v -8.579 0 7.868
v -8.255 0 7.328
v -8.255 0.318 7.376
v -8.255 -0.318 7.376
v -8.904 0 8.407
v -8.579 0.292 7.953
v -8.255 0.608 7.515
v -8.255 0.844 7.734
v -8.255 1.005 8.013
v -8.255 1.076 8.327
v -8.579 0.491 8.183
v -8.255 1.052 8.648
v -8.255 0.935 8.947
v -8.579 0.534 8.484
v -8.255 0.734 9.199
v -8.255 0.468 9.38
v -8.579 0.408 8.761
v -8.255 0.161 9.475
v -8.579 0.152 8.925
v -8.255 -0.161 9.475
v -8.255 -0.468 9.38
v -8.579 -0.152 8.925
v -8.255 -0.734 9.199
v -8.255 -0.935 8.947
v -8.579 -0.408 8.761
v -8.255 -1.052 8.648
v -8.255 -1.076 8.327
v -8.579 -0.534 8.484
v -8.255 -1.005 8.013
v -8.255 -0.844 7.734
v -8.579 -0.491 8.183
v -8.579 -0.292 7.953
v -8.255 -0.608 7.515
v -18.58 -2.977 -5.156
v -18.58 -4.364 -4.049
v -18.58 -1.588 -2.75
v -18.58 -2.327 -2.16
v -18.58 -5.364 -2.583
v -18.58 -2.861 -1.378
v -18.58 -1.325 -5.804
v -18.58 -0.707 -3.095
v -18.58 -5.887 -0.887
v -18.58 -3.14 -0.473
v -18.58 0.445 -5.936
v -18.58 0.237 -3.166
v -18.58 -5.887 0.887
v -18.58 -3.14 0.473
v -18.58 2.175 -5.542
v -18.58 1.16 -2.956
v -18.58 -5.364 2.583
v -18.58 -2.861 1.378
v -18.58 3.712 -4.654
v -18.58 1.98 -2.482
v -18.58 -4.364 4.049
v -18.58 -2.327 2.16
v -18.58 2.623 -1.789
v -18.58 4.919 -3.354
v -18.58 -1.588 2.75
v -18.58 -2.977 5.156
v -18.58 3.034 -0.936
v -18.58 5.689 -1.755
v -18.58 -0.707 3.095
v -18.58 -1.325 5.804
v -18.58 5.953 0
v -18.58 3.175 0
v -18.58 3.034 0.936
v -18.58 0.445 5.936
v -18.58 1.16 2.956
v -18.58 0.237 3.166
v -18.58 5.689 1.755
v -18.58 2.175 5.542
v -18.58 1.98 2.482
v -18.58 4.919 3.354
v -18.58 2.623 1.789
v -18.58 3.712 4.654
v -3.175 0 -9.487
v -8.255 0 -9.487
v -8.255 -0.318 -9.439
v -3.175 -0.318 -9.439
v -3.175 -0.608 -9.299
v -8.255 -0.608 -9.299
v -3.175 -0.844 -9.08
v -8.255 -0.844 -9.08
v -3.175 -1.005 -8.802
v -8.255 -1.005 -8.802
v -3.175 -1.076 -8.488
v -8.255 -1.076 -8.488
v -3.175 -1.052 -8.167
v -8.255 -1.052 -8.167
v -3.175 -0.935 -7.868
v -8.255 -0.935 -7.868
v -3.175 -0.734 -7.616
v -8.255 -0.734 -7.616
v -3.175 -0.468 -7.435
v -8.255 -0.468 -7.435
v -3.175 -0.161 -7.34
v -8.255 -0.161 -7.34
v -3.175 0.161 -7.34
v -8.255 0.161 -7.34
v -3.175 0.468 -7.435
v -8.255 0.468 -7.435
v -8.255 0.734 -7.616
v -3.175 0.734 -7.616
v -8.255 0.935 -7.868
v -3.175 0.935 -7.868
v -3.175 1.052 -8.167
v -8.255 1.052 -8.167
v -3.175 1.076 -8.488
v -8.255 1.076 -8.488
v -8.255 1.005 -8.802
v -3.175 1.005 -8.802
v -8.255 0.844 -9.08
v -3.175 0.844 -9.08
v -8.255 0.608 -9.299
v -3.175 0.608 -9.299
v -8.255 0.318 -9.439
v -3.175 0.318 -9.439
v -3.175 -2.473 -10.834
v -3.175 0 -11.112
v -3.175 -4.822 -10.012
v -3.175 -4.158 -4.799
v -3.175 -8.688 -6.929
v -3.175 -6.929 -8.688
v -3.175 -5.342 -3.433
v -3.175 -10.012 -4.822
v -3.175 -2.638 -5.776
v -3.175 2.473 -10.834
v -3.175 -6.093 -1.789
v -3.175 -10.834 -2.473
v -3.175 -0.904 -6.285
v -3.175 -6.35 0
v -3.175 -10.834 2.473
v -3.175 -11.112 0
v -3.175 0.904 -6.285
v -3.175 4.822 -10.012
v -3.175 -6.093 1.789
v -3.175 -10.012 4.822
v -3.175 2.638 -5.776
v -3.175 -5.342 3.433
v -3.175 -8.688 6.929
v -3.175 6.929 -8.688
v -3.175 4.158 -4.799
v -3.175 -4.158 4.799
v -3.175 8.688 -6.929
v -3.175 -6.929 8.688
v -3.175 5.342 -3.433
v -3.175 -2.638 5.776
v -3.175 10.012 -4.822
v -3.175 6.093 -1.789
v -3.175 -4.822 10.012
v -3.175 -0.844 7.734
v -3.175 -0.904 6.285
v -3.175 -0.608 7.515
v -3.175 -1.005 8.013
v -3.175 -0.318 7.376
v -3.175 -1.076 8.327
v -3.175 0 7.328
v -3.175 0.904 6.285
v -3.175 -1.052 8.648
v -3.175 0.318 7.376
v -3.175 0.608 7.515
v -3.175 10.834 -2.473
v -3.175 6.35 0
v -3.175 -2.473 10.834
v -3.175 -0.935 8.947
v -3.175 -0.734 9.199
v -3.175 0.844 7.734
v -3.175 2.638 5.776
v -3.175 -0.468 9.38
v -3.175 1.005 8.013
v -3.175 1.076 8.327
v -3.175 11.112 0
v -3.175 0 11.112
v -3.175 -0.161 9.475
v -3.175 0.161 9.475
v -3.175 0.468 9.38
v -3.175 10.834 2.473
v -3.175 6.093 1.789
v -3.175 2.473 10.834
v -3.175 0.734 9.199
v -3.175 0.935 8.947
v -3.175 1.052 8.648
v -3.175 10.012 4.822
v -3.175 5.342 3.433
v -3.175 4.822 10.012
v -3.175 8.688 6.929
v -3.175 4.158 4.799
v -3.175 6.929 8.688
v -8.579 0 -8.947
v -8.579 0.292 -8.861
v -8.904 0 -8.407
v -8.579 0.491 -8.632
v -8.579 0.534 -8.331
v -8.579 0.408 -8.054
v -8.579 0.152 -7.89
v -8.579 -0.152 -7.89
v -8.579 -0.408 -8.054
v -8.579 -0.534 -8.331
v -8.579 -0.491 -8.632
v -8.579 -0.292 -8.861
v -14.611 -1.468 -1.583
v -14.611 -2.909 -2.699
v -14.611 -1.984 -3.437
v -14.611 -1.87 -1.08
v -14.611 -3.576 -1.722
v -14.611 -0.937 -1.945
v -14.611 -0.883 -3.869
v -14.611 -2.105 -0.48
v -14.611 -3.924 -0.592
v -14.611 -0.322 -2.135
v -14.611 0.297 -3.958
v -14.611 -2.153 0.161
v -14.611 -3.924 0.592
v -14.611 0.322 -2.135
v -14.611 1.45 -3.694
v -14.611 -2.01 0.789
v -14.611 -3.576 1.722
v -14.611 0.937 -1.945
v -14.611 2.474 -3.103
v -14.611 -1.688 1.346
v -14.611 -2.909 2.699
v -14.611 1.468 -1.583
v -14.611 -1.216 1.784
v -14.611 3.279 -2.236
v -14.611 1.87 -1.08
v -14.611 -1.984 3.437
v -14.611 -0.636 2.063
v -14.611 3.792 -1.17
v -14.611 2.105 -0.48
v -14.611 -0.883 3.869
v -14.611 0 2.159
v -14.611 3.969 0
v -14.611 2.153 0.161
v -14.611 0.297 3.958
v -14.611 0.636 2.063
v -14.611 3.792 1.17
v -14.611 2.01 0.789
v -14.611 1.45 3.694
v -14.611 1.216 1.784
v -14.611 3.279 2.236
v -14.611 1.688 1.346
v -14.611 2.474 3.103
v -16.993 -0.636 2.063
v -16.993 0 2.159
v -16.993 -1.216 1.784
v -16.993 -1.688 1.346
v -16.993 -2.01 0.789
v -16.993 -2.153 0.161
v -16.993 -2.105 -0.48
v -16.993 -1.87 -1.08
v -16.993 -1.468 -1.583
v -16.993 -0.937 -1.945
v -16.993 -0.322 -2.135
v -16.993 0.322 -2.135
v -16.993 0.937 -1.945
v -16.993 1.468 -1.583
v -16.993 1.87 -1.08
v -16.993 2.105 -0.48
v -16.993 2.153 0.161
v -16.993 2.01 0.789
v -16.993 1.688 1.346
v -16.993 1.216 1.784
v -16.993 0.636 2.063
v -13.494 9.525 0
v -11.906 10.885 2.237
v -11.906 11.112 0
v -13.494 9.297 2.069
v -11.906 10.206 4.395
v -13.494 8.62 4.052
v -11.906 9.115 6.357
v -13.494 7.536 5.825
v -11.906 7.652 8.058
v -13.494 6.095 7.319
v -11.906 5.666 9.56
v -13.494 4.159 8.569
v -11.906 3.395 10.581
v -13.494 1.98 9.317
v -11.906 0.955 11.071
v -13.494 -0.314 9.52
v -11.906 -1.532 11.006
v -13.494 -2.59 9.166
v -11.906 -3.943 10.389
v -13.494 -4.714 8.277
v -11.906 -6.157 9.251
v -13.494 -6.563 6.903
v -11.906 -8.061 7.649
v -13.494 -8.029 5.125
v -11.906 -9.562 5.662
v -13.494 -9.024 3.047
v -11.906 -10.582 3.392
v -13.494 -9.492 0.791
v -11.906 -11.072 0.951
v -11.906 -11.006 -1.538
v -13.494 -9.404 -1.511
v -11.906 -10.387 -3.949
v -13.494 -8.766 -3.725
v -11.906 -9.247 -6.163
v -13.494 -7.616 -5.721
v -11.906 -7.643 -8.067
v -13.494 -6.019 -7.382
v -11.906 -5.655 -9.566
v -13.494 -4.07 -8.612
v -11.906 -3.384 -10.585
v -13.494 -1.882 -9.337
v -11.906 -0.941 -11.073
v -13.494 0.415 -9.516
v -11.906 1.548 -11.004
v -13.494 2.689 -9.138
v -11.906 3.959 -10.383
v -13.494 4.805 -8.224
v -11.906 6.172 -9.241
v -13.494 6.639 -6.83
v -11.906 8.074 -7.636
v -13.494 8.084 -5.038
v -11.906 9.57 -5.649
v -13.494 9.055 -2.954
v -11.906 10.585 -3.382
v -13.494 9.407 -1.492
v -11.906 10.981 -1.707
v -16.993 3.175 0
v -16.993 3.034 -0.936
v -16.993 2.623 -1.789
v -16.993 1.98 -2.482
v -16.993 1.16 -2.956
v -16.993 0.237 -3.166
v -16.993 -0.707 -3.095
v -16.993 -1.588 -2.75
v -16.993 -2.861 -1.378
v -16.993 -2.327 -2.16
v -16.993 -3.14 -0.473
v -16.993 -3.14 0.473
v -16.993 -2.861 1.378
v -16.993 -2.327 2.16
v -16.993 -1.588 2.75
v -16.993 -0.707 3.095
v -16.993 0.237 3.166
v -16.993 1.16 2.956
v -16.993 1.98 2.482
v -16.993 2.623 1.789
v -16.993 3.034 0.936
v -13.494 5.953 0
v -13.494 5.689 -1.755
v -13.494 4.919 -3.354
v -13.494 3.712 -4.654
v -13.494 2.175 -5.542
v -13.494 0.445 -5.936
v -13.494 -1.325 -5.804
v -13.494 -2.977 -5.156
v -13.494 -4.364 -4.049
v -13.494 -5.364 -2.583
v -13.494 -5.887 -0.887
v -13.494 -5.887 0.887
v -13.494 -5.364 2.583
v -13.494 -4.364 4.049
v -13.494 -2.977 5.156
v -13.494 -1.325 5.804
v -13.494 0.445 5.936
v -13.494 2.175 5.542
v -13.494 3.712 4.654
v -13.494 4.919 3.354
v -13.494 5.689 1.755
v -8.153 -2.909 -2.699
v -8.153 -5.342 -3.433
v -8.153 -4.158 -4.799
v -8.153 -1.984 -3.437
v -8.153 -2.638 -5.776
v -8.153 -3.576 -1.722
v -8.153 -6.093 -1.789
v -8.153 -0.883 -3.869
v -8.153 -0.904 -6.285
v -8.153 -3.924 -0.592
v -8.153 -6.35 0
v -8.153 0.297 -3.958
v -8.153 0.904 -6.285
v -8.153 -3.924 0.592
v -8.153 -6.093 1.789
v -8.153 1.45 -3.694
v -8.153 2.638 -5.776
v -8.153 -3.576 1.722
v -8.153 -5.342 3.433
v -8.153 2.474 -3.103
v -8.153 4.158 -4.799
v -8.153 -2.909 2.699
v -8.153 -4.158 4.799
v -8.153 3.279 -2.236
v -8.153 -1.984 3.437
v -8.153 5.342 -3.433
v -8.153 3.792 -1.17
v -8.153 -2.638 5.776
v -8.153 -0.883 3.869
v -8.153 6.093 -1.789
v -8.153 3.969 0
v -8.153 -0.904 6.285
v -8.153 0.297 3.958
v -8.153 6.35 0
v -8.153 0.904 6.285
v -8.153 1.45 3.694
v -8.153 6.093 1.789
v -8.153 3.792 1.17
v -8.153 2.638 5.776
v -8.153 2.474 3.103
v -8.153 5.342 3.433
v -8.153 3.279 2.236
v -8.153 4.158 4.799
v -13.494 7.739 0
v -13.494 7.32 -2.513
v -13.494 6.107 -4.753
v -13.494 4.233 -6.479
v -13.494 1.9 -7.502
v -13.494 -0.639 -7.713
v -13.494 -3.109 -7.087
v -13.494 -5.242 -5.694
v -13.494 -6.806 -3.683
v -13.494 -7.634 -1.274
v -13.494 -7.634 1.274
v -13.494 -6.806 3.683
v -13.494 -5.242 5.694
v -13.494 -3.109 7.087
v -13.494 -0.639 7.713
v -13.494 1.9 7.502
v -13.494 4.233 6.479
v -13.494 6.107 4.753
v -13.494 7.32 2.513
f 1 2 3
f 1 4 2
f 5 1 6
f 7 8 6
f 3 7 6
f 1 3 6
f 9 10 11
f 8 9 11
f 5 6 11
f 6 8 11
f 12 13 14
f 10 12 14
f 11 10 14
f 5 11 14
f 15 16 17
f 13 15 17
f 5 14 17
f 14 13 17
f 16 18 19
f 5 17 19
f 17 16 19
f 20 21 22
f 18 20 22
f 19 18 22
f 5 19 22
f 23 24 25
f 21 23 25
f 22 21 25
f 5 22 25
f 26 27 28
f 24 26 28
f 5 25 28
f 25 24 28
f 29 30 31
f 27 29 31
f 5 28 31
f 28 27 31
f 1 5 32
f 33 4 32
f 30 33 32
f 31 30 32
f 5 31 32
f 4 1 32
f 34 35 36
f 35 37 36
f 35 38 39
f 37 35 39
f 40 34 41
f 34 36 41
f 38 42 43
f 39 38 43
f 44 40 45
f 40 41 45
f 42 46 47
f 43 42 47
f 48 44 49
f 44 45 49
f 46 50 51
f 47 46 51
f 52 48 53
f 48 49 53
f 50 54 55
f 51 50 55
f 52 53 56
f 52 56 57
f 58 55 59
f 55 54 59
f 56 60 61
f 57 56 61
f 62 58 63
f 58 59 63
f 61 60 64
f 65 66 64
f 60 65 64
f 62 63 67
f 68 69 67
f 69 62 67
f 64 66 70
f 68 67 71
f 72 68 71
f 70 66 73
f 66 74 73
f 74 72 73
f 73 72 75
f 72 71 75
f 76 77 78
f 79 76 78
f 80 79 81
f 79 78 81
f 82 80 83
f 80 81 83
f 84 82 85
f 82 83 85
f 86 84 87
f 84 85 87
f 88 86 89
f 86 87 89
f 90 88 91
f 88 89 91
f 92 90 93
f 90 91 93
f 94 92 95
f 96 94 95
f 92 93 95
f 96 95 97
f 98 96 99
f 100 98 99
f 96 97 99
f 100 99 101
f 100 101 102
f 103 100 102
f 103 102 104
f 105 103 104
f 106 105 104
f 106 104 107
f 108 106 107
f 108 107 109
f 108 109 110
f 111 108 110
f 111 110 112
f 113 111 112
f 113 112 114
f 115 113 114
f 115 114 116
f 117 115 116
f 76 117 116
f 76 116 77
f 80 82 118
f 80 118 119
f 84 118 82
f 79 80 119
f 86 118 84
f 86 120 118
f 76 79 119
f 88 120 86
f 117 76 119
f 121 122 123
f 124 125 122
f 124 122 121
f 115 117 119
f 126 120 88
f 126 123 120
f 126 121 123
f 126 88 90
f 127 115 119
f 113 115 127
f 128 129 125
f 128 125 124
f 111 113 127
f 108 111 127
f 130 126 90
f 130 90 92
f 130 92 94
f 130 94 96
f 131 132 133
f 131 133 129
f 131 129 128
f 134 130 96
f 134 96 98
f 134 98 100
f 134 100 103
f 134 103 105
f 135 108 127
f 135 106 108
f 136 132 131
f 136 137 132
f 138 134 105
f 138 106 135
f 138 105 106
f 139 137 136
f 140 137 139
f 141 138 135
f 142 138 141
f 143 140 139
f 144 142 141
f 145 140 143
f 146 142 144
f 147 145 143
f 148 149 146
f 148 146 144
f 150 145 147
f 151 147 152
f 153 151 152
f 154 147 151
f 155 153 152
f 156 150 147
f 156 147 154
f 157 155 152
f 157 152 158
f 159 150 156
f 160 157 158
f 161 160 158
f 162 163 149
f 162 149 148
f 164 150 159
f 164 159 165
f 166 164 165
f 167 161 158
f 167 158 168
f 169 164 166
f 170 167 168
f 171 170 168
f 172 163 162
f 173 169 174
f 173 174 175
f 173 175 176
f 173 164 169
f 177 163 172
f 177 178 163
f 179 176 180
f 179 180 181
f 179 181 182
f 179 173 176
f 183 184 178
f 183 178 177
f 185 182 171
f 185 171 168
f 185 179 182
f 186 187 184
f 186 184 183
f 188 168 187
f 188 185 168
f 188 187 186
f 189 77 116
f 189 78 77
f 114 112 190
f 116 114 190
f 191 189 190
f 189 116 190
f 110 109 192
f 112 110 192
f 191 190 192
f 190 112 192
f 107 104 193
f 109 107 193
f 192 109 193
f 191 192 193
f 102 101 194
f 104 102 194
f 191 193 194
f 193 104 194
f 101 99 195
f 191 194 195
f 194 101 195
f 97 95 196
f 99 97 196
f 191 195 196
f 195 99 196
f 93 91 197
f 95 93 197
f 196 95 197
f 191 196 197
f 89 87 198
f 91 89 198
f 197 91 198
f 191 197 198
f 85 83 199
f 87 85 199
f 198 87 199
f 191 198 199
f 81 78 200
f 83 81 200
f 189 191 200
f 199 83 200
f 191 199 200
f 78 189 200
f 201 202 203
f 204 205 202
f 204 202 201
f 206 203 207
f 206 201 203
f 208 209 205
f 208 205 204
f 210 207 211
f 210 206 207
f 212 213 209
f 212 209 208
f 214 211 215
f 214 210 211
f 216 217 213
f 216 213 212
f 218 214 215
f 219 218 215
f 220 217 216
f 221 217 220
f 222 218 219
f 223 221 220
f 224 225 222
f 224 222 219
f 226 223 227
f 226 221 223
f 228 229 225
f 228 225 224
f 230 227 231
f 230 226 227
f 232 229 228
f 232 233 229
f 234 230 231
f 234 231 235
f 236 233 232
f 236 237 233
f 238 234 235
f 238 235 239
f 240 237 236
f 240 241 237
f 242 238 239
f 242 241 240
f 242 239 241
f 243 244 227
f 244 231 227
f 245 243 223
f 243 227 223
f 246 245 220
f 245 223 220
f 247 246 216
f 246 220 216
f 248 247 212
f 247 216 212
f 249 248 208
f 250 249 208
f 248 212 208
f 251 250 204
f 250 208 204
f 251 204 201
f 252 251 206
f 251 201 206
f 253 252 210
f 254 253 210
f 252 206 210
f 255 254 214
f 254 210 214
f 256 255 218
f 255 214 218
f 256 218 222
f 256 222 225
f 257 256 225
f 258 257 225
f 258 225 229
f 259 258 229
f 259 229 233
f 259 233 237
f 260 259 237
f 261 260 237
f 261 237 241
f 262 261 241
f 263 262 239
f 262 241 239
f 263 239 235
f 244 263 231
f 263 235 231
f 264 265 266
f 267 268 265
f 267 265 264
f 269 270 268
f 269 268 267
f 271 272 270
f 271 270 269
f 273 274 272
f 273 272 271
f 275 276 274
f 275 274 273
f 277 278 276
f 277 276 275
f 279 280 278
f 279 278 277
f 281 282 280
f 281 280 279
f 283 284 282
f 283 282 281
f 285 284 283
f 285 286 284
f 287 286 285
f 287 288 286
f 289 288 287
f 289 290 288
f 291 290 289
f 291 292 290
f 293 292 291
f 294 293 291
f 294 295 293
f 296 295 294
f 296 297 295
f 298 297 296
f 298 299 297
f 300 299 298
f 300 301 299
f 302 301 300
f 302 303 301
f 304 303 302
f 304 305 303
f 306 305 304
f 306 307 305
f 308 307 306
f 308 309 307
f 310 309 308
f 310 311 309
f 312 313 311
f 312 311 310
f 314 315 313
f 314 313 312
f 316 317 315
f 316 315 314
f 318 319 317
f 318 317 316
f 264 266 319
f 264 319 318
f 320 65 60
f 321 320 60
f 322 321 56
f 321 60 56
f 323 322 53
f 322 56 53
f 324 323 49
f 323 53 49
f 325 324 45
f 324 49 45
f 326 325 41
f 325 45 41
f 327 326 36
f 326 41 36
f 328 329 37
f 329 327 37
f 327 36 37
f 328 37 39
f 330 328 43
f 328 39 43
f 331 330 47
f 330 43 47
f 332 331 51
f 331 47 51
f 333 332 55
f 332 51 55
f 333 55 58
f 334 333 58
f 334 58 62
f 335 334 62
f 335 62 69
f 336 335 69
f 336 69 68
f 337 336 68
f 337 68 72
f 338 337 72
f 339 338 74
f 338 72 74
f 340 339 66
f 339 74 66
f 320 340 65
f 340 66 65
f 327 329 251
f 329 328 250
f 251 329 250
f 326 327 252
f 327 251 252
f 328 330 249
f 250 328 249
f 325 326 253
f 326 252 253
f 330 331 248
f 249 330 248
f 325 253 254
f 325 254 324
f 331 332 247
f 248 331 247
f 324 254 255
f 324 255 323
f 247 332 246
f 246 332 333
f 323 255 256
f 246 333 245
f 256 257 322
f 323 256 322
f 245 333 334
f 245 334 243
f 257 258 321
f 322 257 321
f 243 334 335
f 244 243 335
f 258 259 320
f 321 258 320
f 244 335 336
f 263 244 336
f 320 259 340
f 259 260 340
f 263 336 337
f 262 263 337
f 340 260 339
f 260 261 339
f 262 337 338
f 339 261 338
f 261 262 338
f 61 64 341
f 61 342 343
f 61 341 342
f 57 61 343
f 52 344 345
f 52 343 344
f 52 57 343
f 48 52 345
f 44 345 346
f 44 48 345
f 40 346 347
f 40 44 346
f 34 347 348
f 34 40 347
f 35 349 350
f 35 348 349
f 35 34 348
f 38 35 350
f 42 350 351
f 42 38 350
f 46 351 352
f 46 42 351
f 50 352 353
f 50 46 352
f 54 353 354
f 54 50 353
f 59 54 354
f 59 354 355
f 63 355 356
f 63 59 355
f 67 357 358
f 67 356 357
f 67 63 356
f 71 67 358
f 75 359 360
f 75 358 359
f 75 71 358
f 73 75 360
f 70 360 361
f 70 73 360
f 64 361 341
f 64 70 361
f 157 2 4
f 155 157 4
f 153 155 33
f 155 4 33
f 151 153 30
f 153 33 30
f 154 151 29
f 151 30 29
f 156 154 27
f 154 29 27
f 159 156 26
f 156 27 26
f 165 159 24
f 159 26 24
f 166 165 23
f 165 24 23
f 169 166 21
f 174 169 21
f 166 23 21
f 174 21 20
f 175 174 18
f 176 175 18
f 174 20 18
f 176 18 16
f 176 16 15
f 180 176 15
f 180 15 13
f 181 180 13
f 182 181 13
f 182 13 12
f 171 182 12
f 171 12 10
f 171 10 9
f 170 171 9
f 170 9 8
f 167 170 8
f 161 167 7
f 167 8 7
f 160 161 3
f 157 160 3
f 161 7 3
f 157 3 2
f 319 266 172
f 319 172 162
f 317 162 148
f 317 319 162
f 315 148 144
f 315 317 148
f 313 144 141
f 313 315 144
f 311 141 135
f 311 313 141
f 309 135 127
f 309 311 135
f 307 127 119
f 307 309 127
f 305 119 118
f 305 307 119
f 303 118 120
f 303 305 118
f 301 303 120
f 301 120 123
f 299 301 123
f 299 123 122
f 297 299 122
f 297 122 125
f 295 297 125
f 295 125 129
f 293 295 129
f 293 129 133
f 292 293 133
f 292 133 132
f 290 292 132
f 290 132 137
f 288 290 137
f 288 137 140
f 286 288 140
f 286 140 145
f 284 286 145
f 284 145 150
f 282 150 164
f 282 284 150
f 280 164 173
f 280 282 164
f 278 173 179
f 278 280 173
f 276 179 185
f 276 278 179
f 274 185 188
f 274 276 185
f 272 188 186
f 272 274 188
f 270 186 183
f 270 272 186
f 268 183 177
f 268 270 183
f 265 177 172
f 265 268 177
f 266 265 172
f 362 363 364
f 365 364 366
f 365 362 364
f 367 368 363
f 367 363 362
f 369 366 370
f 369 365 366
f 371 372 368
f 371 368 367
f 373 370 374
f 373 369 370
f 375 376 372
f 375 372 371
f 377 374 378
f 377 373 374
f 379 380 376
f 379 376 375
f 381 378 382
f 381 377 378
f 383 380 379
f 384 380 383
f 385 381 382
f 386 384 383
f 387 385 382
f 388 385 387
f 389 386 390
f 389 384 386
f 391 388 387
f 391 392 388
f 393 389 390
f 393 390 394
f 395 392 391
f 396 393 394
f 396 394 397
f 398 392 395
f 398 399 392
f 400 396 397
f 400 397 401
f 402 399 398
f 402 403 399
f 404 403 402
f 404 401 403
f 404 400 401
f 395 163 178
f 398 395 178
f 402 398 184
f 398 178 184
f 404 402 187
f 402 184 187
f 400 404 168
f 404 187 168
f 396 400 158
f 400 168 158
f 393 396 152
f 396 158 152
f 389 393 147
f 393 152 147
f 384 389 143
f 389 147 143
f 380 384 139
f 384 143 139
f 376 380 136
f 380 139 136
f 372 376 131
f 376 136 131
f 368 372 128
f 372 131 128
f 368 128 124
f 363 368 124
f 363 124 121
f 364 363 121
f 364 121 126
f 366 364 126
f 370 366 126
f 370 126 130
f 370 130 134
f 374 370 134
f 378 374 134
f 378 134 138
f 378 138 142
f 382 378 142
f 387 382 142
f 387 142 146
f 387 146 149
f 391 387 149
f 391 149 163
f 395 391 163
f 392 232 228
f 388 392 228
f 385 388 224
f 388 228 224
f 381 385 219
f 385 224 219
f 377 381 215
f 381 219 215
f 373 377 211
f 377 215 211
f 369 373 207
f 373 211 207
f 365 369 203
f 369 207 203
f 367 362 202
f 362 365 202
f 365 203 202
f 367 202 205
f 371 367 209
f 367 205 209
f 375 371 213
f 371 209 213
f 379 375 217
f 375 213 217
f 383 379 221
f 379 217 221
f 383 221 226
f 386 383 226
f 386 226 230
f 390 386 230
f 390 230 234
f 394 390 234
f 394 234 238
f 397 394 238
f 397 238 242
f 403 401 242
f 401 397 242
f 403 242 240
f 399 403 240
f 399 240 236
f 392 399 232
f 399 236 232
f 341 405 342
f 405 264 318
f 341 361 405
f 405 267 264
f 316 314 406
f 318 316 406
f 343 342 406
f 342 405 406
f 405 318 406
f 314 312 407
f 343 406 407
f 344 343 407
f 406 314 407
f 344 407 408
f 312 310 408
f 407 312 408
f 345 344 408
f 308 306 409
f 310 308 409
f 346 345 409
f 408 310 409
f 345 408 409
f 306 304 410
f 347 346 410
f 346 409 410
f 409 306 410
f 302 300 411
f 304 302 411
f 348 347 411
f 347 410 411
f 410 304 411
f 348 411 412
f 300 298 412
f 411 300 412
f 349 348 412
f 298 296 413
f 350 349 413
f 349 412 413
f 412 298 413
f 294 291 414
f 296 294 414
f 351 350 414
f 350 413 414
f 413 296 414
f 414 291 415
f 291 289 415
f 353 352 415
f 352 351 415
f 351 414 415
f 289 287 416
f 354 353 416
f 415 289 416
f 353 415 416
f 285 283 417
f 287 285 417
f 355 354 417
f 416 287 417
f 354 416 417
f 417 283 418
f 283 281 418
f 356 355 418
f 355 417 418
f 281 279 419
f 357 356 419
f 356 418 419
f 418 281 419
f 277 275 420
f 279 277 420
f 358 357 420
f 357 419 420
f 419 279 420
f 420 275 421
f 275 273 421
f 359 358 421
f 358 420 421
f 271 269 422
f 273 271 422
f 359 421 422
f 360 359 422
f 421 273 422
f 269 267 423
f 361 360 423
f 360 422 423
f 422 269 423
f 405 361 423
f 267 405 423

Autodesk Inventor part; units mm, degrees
ref_plane "YZ Plane" through (0, 0, 0) normal (1, 0, 0) x (0, 1, 0)
ref_plane "XZ Plane" through (0, 0, 0) normal (0, 1, 0) x (-1, 0, 0)
ref_plane "XY Plane" through (0, 0, 0) normal (0, 0, 1) x (1, 0, 0)
sketch "Sketch1" plane through (0, 0, 0) normal (0, 0, 1) x (1, 0, 0)
  line L0 (0, 0) -> (8.7313, 0) construction
  line L1 (0, 0) -> (0, 7.9375) construction
  line L2 (0, 7.9375) -> (8.7312, 7.9375) construction
  line L3 (8.7312, 7.9375) -> (8.7313, 0) construction
  line L4 (8.7312, 7.9375) -> (45.2438, 7.9375) construction
  line L5 (8.7312, 7.9375) -> (8.7312, 14.2875) construction
  line L6 (8.7312, 14.2875) -> (9.525, 14.2875) construction
  line L7 (9.525, 14.2875) -> (9.525, 0) construction
  line L8 (9.525, 0) -> (8.7313, 0) construction
  line L9 (9.525, 0) -> (19.05, 0) construction
  line L10 (19.05, 0) -> (19.05, 26.67) construction
  line L11 (19.05, 26.67) -> (9.525, 26.67) construction
  line L12 (9.525, 26.67) -> (9.525, 14.2875) construction
  line L13 (14.2875, 0) -> (14.2875, 26.67) construction
  line L14 (14.2875, 17.4625) -> (21.4312, 17.4625) construction
  line L15 (21.4312, 17.4625) -> (21.4313, 0) construction
  line L16 (21.4313, 0) -> (19.05, 0) construction
  line L17 (21.4313, 0) -> (22.225, 0) construction
  line L18 (22.225, 0) -> (22.225, 14.2875) construction
  line L19 (22.225, 14.2875) -> (21.4313, 14.2875) construction
  line L20 (21.4313, 14.2875) -> (21.4313, 0) construction
  line L21 (22.225, 0) -> (31.75, 0) construction
  line L22 (31.75, 0) -> (31.75, 20.32) construction
  line L23 (31.75, 20.32) -> (22.225, 20.32) construction
  line L24 (22.225, 20.32) -> (22.225, 0) construction
  line L25 (26.9875, 20.32) -> (26.9875, 0) construction
  line L26 (26.9875, 17.4625) -> (34.1313, 17.4625) construction
  line L27 (34.1313, 17.4625) -> (34.1313, 0) construction
  line L28 (34.1313, 0) -> (31.75, 0) construction
  line L29 (34.1313, 0) -> (34.925, 0) construction
  line L30 (34.925, 0) -> (34.925, 14.2875) construction
  line L31 (34.925, 14.2875) -> (34.1313, 14.2875) construction
  line L32 (34.1313, 14.2875) -> (34.1313, 0) construction
  line L33 (34.925, 0) -> (36.5125, 0) construction
  line L34 (36.5125, 0) -> (36.5125, 9.525) construction
  line L35 (36.5125, 9.525) -> (34.925, 9.525) construction
  line L36 (34.925, 9.525) -> (34.925, 0) construction
  line L37 (45.2438, 7.9375) -> (45.2438, 0) construction
  line L38 (45.2438, 0) -> (36.5125, 0) construction
  line L39 (11.9063, 26.67) -> (11.9063, 0) construction
  line L40 (24.6063, 20.32) -> (24.6063, 0) construction
  line L41 (0, 7.9375) -> (0, 17.4625) construction
  line L42 (0, 17.4625) -> (8.7312, 17.4625) construction
  line L43 (8.7312, 17.4625) -> (8.7312, 14.2875) construction
  line L44 (0, 3.175) -> (45.2438, 3.175) construction
  circle A0 centre (11.9063, 5.5562) radius 2.3813 construction
  circle A1 centre (24.6063, 5.5562) radius 2.3812 construction
  circle A2 centre (11.9063, 5.8103) radius 2.3813 construction
  circle A3 centre (11.9063, 7.5565) radius 2.3813 construction
  circle A4 centre (24.6063, 5.8103) radius 2.3812 construction
  circle A5 centre (24.6063, 7.5565) radius 2.3812 construction
  line L45 (9.525, 8.1915) -> (14.2875, 8.1915) construction
  line L46 (12.6386, 3.175) -> (14.6388, 5.1753) construction
  line L47 (14.6388, 5.1753) -> (21.8737, 5.1753) construction
  line L48 (21.8737, 5.1753) -> (23.8739, 3.175) construction
  line L49 (22.225, 8.1915) -> (26.9875, 8.1915) construction
  line L50 (10.3187, 5.1753) -> (17.4901, 5.1753) construction
  line L51 (26.1938, 5.1753) -> (19.0224, 5.1753) construction
  line L52 (0, 6.35) -> (6.731, 6.35) construction
  line L53 (6.731, 6.35) -> (6.731, 0) construction
  line L54 (10.3187, 5.1753) -> (8.3185, 3.175) construction
  line L55 (17.4901, 5.1753) -> (19.4903, 3.175) construction
  line L56 (19.4903, 3.175) -> (26.1938, 3.175) construction
  line L57 (26.1938, 3.175) -> (28.1015, 0) construction
  line L58 (26.1938, 5.1753) -> (28.194, 3.175) construction
  line L59 (28.194, 3.175) -> (34.8974, 3.175) construction
  line L60 (34.8974, 3.175) -> (36.8052, 0) construction
  line L61 (6.731, 5.5562) -> (45.2438, 5.5563) construction
  line L62 (37.202, 0) -> (33.8635, 5.5563) construction
  line L63 (19.0224, 5.1753) -> (17.0222, 3.175) construction
  line L64 (17.0222, 3.175) -> (-3.175, 3.175) construction
  line L65 (45.2438, 7.9375) -> (45.2438, 17.4625) construction
  line L66 (45.2438, 17.4625) -> (36.5125, 17.4625) construction
  line L67 (36.5125, 17.4625) -> (36.5125, 9.525) construction
  line L68 (45.2438, 7.9375) -> (51.5938, 7.9375) construction
  line L69 (51.5938, 7.9375) -> (51.5938, 0) construction
  line L70 (51.5938, 0) -> (45.2438, 0) construction
  line L71 (51.5938, 6.35) -> (64.2938, 6.35) construction
  line L72 (64.2938, 6.35) -> (64.2938, 0) construction
  line L73 (64.2938, 0) -> (51.5938, 0) construction
  line L74 (-8.1534, 3.175) -> (-8.1534, 2.3812) construction
  line L75 (-8.1534, 0) -> (36.8052, 0) construction
  line L76 (-3.175, 3.175) -> (-3.175, 2.3812) construction
  line L77 (-3.175, 2.3812) -> (-8.1534, 2.3812) construction
  line L78 (-8.1534, 3.175) -> (-8.1534, 6.35) construction
  line L79 (-8.1534, 6.35) -> (-3.175, 6.35) construction
  line L80 (-3.175, 6.35) -> (-3.175, 3.175) construction
  line L81 (-3.175, 0) -> (-3.175, 2.3812) construction
  line L82 (-0.7937, 0) -> (-0.7938, 11.1125) construction
  line L83 (-0.7938, 11.1125) -> (-3.175, 11.1125) construction
  line L84 (-3.175, 11.1125) -> (-3.175, 6.35) construction
  line L85 (-3.175, 3.175) -> (-8.1534, 3.175) construction
  line L86 (-8.1534, 2.3812) -> (-8.1534, 0) construction
  line L87 (-8.1534, 2.7051) -> (-9.652, 2.7051) construction
  line L88 (-9.652, 2.7051) -> (-9.652, 0) construction
  line L89 (-9.652, 0) -> (-8.1534, 0) construction
  line L90 (-8.1534, 1.4224) -> (-5.6134, 1.4224) construction
  line L91 (-5.6134, 1.4224) -> (-5.6134, 0) construction
  line L92 (-5.6134, 1.4224) -> (-3.0734, 1.4224) construction
  line L93 (-3.0734, 1.4224) -> (-3.0734, 0) construction
  line L94 (-3.175, 11.1125) -> (-13.4938, 11.1125) construction
  line L95 (-13.4938, 11.1125) -> (-13.4937, 5.9531) construction
  line L96 (-13.4937, 5.9531) -> (-18.5801, 5.9531) construction
  line L97 (-18.5801, 5.9531) -> (-18.5801, 0) construction
  line L98 (-18.5801, 0) -> (-9.652, 0) construction
  line L99 (-8.1534, 3.9687) -> (-14.6113, 3.9687) construction
  line L100 (-14.6113, 3.9687) -> (-14.6113, 0) construction
  line L101 (-14.6113, 3.429) -> (-10.4457, 3.429) construction
  line L102 (-10.4457, 3.429) -> (-10.4457, 0) construction
  line L103 (-16.9926, 3.175) -> (-16.9926, 0) construction
  line L104 (-16.9926, 3.175) -> (-18.5801, 3.175) construction
  dimension "d0" = 8.7312
  dimension "d1" = 7.9375
  dimension "d2" = 0.7937
  dimension "d3" = 14.2875
  dimension "d4" = 9.525
  dimension "d5" = 26.67
  dimension "d6" = 7.1437
  dimension "d7" = 17.4625
  dimension "d8" = 0.7937
  dimension "d9" = 14.2875
  dimension "d10" = 9.525
  dimension "d11" = 20.32
  dimension "d12" = 7.1437
  dimension "d13" = 17.4625
  dimension "d14" = 0.7937
  dimension "d15" = 14.2875
  dimension "d16" = 1.5875
  dimension "d17" = 9.525
  dimension "d18" = 8.7312
  dimension "d19" = 2.3813
  dimension "d20" = 2.3813
  dimension "d21" = 17.4625
  dimension "d22" = 3.175
  dimension "d23" = 4.7625
  dimension "d24" = 4.7625
  dimension "d26" = 0.254
  dimension "d28" = 45
  dimension "d29" = 45
  dimension "d30" = 0.254
  dimension "d31" = 7.2348
  dimension "d32" = 5.1753
  dimension "d33" = 7.1713
  dimension "d34" = 1.5875
  dimension "d35" = 7.1713
  dimension "d36" = 1.5875
  dimension "d37" = 6.35
  dimension "d39" = 45
  dimension "d40" = 45
  dimension "d41" = 1.5875
  dimension "d42" = 59
  dimension "d43" = 6.7034
  dimension "d44" = 6.7034
  dimension "d45" = 5.5563
  dimension "d46" = 0.3969
  dimension "d47" = 1.5875
  dimension "d48" = 6.731
  dimension "d52" = 17.4625
  dimension "d53" = 6.35
  dimension "d54" = 12.7
  dimension "d55" = 6.35
  dimension "d56" = 2.3813
  dimension "d57" = 4.9784
  dimension "d58" = 6.35
  dimension "d66" = 2.3813
  dimension "d67" = 0.7937
  dimension "d68" = 11.1125
  dimension "d69" = 2.7051
  dimension "d70" = 1.4986
  dimension "d71" = 1.4224
  dimension "d72" = 2.54
  dimension "d73" = 2.54
  dimension "d74" = 3.9688
  dimension "d75" = 4.1656
  dimension "d76" = 3.429
sketch "Sketch2" plane through (0, 0, 0) normal (0, 0, 1) x (1, 0, 0)
  line L0 (-3.175, 11.1125) -> (-3.175, 6.35) projected
  line L1 (-8.1534, 6.35) -> (-3.175, 6.35) projected
  line L2 (-8.1534, 3.9687) -> (-14.6113, 3.9687) projected
  line L3 (-14.6113, 3.9687) -> (-14.6113, 0) projected
  line L4 (-16.9926, 3.175) -> (-16.9926, 0) projected
  line L5 (-16.9926, 3.175) -> (-18.5801, 3.175) projected
  line L6 (-13.4937, 5.9531) -> (-18.5801, 5.9531) projected
  line L7 (-13.4938, 11.1125) -> (-13.4937, 5.9531) projected
  line L8 (-3.175, 11.1125) -> (-13.4938, 11.1125) projected
  line L9 (-18.5801, 5.9531) -> (-18.5801, 3.175)
  line L10 (-16.9926, 0) -> (-14.6113, 0)
  line L11 (-8.1534, 3.9687) -> (-8.1534, 6.35)
  point P0 (0, 0)
revolve "Revolution1" add sketch "Sketch2" angle 360 about axis through (-16.9926, 0, 0) along (1, 0, 0)
sketch "Sketch3" plane through (-16.9926, 0, 0) normal (-1, 0, 0) x (0, 0, 1)
  circle A0 centre (0, 0) radius 3.175 projected
hole "Hole1" at (-16.9926, 0, 0) direction (1, 0, 0) diameter 4.318 end through all clearance for "Socket Head Cap Screw" size "#8" standard "Ansi Unified Screw Threads"
sketch "Sketch5" plane through (-3.175, 0, 0) normal (1, 0, 0) x (0, 0, -1)
  circle A0 centre (0, 0) radius 6.35 projected
  circle A1 centre (0, 0) radius 11.1125 projected
  line L0 (-11.1125, 0) -> (-6.35, 0)
  line L1 (-6.35, 0) -> (6.35, 0)
  line L2 (6.35, 0) -> (11.1125, 0)
  circle A2 centre (-8.4074, 0) radius 2.7051
  point P0 (8.4074, 0)
  point P1 (-5.7023, 0)
  dimension "d98" = 5.4102
  dimension "d99" = 0.6477
  dimension "d100" = 2.0574
  dimension "d101" = 2.0574
hole "Hole3" at (-3.175, 0, 8.4074) at (-3.175, 0, -8.4074) direction (-1, 0, 0) diameter 2.159 depth 5.08 tip angle 118
chamfer "Chamfer1" distance 1.5875 angle 45 1 edges at (-13.4937, -11.1125, 0)
equation "\"d9\" = d3"
equation "\"d12\" = d6"
equation "\"d13\" = d7"
equation "\"d15\" = d9"
equation "\"d18\" = d0"
equation "\"d20\" = d19"
equation "\"d35\" = d33"
equation "\"d36\" = d34"
equation "\"d43\" = d44"
equation "\"d52\" = d13"
properties part number "Ball Shifting Outline" material "Aluminum 6061"
